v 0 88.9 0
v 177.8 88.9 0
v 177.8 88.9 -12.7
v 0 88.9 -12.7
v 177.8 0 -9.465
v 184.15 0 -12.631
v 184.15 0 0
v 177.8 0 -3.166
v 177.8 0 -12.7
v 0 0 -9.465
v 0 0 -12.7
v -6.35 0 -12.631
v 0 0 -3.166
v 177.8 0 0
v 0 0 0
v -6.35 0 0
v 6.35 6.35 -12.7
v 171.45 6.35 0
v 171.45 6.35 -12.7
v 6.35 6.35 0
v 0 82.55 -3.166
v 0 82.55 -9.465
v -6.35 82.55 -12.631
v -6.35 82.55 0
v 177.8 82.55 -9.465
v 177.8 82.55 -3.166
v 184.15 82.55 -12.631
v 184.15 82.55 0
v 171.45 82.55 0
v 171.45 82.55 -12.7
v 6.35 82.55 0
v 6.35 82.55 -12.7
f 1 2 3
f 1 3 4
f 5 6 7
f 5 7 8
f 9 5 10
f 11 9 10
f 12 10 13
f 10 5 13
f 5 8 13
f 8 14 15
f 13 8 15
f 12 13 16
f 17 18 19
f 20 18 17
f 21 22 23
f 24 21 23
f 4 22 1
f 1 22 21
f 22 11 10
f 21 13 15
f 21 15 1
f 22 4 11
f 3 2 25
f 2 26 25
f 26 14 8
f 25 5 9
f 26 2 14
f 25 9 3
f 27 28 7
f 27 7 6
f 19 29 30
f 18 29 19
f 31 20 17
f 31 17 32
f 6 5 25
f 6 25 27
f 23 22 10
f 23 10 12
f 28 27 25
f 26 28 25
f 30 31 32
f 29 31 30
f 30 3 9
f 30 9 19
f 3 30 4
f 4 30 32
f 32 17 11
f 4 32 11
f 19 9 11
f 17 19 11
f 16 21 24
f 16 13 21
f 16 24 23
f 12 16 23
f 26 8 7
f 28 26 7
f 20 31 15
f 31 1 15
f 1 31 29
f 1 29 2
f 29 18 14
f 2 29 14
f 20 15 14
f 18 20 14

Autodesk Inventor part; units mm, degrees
ref_plane "YZ Plane" through (0, 0, 0) normal (1, 0, 0) x (0, 1, 0)
ref_plane "XZ Plane" through (0, 0, 0) normal (0, 1, 0) x (-1, 0, 0)
ref_plane "XY Plane" through (0, 0, 0) normal (0, 0, 1) x (1, 0, 0)
sketch "Sketch1" plane through (0, 0, 0) normal (0, 1, 0) x (-1, 0, 0)
  line L0 (0, 0) -> (-177.8, 0)
  line L1 (-177.8, 0) -> (-177.8, -12.7)
  line L2 (-177.8, -12.7) -> (0, -12.7)
  line L3 (0, -12.7) -> (0, 0)
  dimension "d0" = 177.8
  dimension "d1" = 12.7
extrude "Extrusion1" add sketch "Sketch1" along normal blind 88.9
sketch "Sketch2" plane through (0, 0, 0) normal (0, 1, 0) x (-1, 0, 0)
  line L0 (0, -12.7) -> (0, 0) construction
  line L1 (0, -12.6308) -> (0, 0) construction
  line L2 (0, -6.3154) -> (6.35, -6.3154) construction
  line L3 (6.35, 0) -> (6.35, -12.6308)
  line L4 (0, -6.3154) -> (0, -3.1658)
  line L5 (0, -6.3154) -> (0, -9.465)
  line L6 (0, -9.465) -> (6.35, -12.6308)
  line L7 (0, -3.1658) -> (6.35, 0)
  line L8 (-177.8, -12.7) -> (0, -12.7) construction
  line L9 (-88.9, -12.7) -> (-88.9, 0) construction
  line L10 (-177.8, -12.7) -> (-177.8, 0) construction
  line L11 (-184.15, 0) -> (-184.15, -12.6308)
  line L12 (-177.8, -9.465) -> (-184.15, -12.6308)
  line L13 (-177.8, -3.1658) -> (-184.15, 0)
  line L14 (-177.8, -9.465) -> (-177.8, -3.1658)
  line L15 (0, -9.465) -> (0, -3.1658)
  line L16 (-177.8, -9.465) -> (-184.15, -12.6308)
  line L17 (-184.15, 0) -> (-177.8, -3.1658)
  dimension "d4" = 6.35
  dimension "d5" = 3.1496
  dimension "d6" = 3.1496
  dimension "d9" = 12.6308
extrude "Extrusion2" add sketch "Sketch2" along normal blind 82.55
sketch "Sketch3" plane through (0, 0, 0) normal (0, 0, 1) x (1, 0, 0)
  line L0 (0, 0) -> (177.8, 0) projected
  line L1 (177.8, 0) -> (177.8, 88.9) projected
  line L2 (0, 88.9) -> (177.8, 88.9) projected
  line L3 (0, 0) -> (0, 88.9) projected
  line L4 (171.45, 82.55) -> (171.45, 6.35)
  line L5 (171.45, 6.35) -> (6.35, 6.35)
  line L6 (31.75, 82.55) -> (31.75, 6.35)
  line L7 (6.35, 6.35) -> (6.35, 82.55)
  line L8 (6.35, 82.55) -> (171.45, 82.55)
  line L9 (38.1, 82.55) -> (38.1, 6.35)
  line L10 (63.5, 82.55) -> (63.5, 6.35)
  line L11 (69.85, 82.55) -> (69.85, 6.35)
  line L12 (95.25, 82.55) -> (95.25, 6.35)
  line L13 (101.6, 82.55) -> (101.6, 6.35)
  line L14 (127, 82.55) -> (127, 6.35)
  line L15 (133.35, 82.55) -> (133.35, 6.35)
  line L16 (158.75, 82.55) -> (158.75, 6.35)
  line L17 (165.1, 82.55) -> (165.1, 6.35)
  line L18 (6.35, 82.55) -> (171.45, 82.55)
  line L19 (171.45, 82.55) -> (171.45, 6.35)
  line L20 (171.45, 6.35) -> (6.35, 6.35)
  line L21 (6.35, 6.35) -> (6.35, 82.55)
  dimension "d12" = 6.35
  dimension "d13" = 25.4
  dimension "d14" = 6.35
  dimension "d15" = 25.4
  dimension "d16" = 6.35
  dimension "d17" = 25.4
  dimension "d18" = 6.35
  dimension "d19" = 25.4
  dimension "d20" = 6.35
extrude "Extrusion3" cut sketch "Sketch3" against normal blind 76.2 contours L4 L5 L17 L8 | L17 L5 L16 L8 | L16 L5 L15 L8 | L15 L5 L14 L8 | L14 L5 L13 L8 | L13 L5 L12 L8 | L12 L5 L11 L8 | L11 L5 L10 L8 | L10 L5 L9 L8 | L9 L5 L6 L8 | L6 L5 L7 L8
properties part number "doveTailBar"
